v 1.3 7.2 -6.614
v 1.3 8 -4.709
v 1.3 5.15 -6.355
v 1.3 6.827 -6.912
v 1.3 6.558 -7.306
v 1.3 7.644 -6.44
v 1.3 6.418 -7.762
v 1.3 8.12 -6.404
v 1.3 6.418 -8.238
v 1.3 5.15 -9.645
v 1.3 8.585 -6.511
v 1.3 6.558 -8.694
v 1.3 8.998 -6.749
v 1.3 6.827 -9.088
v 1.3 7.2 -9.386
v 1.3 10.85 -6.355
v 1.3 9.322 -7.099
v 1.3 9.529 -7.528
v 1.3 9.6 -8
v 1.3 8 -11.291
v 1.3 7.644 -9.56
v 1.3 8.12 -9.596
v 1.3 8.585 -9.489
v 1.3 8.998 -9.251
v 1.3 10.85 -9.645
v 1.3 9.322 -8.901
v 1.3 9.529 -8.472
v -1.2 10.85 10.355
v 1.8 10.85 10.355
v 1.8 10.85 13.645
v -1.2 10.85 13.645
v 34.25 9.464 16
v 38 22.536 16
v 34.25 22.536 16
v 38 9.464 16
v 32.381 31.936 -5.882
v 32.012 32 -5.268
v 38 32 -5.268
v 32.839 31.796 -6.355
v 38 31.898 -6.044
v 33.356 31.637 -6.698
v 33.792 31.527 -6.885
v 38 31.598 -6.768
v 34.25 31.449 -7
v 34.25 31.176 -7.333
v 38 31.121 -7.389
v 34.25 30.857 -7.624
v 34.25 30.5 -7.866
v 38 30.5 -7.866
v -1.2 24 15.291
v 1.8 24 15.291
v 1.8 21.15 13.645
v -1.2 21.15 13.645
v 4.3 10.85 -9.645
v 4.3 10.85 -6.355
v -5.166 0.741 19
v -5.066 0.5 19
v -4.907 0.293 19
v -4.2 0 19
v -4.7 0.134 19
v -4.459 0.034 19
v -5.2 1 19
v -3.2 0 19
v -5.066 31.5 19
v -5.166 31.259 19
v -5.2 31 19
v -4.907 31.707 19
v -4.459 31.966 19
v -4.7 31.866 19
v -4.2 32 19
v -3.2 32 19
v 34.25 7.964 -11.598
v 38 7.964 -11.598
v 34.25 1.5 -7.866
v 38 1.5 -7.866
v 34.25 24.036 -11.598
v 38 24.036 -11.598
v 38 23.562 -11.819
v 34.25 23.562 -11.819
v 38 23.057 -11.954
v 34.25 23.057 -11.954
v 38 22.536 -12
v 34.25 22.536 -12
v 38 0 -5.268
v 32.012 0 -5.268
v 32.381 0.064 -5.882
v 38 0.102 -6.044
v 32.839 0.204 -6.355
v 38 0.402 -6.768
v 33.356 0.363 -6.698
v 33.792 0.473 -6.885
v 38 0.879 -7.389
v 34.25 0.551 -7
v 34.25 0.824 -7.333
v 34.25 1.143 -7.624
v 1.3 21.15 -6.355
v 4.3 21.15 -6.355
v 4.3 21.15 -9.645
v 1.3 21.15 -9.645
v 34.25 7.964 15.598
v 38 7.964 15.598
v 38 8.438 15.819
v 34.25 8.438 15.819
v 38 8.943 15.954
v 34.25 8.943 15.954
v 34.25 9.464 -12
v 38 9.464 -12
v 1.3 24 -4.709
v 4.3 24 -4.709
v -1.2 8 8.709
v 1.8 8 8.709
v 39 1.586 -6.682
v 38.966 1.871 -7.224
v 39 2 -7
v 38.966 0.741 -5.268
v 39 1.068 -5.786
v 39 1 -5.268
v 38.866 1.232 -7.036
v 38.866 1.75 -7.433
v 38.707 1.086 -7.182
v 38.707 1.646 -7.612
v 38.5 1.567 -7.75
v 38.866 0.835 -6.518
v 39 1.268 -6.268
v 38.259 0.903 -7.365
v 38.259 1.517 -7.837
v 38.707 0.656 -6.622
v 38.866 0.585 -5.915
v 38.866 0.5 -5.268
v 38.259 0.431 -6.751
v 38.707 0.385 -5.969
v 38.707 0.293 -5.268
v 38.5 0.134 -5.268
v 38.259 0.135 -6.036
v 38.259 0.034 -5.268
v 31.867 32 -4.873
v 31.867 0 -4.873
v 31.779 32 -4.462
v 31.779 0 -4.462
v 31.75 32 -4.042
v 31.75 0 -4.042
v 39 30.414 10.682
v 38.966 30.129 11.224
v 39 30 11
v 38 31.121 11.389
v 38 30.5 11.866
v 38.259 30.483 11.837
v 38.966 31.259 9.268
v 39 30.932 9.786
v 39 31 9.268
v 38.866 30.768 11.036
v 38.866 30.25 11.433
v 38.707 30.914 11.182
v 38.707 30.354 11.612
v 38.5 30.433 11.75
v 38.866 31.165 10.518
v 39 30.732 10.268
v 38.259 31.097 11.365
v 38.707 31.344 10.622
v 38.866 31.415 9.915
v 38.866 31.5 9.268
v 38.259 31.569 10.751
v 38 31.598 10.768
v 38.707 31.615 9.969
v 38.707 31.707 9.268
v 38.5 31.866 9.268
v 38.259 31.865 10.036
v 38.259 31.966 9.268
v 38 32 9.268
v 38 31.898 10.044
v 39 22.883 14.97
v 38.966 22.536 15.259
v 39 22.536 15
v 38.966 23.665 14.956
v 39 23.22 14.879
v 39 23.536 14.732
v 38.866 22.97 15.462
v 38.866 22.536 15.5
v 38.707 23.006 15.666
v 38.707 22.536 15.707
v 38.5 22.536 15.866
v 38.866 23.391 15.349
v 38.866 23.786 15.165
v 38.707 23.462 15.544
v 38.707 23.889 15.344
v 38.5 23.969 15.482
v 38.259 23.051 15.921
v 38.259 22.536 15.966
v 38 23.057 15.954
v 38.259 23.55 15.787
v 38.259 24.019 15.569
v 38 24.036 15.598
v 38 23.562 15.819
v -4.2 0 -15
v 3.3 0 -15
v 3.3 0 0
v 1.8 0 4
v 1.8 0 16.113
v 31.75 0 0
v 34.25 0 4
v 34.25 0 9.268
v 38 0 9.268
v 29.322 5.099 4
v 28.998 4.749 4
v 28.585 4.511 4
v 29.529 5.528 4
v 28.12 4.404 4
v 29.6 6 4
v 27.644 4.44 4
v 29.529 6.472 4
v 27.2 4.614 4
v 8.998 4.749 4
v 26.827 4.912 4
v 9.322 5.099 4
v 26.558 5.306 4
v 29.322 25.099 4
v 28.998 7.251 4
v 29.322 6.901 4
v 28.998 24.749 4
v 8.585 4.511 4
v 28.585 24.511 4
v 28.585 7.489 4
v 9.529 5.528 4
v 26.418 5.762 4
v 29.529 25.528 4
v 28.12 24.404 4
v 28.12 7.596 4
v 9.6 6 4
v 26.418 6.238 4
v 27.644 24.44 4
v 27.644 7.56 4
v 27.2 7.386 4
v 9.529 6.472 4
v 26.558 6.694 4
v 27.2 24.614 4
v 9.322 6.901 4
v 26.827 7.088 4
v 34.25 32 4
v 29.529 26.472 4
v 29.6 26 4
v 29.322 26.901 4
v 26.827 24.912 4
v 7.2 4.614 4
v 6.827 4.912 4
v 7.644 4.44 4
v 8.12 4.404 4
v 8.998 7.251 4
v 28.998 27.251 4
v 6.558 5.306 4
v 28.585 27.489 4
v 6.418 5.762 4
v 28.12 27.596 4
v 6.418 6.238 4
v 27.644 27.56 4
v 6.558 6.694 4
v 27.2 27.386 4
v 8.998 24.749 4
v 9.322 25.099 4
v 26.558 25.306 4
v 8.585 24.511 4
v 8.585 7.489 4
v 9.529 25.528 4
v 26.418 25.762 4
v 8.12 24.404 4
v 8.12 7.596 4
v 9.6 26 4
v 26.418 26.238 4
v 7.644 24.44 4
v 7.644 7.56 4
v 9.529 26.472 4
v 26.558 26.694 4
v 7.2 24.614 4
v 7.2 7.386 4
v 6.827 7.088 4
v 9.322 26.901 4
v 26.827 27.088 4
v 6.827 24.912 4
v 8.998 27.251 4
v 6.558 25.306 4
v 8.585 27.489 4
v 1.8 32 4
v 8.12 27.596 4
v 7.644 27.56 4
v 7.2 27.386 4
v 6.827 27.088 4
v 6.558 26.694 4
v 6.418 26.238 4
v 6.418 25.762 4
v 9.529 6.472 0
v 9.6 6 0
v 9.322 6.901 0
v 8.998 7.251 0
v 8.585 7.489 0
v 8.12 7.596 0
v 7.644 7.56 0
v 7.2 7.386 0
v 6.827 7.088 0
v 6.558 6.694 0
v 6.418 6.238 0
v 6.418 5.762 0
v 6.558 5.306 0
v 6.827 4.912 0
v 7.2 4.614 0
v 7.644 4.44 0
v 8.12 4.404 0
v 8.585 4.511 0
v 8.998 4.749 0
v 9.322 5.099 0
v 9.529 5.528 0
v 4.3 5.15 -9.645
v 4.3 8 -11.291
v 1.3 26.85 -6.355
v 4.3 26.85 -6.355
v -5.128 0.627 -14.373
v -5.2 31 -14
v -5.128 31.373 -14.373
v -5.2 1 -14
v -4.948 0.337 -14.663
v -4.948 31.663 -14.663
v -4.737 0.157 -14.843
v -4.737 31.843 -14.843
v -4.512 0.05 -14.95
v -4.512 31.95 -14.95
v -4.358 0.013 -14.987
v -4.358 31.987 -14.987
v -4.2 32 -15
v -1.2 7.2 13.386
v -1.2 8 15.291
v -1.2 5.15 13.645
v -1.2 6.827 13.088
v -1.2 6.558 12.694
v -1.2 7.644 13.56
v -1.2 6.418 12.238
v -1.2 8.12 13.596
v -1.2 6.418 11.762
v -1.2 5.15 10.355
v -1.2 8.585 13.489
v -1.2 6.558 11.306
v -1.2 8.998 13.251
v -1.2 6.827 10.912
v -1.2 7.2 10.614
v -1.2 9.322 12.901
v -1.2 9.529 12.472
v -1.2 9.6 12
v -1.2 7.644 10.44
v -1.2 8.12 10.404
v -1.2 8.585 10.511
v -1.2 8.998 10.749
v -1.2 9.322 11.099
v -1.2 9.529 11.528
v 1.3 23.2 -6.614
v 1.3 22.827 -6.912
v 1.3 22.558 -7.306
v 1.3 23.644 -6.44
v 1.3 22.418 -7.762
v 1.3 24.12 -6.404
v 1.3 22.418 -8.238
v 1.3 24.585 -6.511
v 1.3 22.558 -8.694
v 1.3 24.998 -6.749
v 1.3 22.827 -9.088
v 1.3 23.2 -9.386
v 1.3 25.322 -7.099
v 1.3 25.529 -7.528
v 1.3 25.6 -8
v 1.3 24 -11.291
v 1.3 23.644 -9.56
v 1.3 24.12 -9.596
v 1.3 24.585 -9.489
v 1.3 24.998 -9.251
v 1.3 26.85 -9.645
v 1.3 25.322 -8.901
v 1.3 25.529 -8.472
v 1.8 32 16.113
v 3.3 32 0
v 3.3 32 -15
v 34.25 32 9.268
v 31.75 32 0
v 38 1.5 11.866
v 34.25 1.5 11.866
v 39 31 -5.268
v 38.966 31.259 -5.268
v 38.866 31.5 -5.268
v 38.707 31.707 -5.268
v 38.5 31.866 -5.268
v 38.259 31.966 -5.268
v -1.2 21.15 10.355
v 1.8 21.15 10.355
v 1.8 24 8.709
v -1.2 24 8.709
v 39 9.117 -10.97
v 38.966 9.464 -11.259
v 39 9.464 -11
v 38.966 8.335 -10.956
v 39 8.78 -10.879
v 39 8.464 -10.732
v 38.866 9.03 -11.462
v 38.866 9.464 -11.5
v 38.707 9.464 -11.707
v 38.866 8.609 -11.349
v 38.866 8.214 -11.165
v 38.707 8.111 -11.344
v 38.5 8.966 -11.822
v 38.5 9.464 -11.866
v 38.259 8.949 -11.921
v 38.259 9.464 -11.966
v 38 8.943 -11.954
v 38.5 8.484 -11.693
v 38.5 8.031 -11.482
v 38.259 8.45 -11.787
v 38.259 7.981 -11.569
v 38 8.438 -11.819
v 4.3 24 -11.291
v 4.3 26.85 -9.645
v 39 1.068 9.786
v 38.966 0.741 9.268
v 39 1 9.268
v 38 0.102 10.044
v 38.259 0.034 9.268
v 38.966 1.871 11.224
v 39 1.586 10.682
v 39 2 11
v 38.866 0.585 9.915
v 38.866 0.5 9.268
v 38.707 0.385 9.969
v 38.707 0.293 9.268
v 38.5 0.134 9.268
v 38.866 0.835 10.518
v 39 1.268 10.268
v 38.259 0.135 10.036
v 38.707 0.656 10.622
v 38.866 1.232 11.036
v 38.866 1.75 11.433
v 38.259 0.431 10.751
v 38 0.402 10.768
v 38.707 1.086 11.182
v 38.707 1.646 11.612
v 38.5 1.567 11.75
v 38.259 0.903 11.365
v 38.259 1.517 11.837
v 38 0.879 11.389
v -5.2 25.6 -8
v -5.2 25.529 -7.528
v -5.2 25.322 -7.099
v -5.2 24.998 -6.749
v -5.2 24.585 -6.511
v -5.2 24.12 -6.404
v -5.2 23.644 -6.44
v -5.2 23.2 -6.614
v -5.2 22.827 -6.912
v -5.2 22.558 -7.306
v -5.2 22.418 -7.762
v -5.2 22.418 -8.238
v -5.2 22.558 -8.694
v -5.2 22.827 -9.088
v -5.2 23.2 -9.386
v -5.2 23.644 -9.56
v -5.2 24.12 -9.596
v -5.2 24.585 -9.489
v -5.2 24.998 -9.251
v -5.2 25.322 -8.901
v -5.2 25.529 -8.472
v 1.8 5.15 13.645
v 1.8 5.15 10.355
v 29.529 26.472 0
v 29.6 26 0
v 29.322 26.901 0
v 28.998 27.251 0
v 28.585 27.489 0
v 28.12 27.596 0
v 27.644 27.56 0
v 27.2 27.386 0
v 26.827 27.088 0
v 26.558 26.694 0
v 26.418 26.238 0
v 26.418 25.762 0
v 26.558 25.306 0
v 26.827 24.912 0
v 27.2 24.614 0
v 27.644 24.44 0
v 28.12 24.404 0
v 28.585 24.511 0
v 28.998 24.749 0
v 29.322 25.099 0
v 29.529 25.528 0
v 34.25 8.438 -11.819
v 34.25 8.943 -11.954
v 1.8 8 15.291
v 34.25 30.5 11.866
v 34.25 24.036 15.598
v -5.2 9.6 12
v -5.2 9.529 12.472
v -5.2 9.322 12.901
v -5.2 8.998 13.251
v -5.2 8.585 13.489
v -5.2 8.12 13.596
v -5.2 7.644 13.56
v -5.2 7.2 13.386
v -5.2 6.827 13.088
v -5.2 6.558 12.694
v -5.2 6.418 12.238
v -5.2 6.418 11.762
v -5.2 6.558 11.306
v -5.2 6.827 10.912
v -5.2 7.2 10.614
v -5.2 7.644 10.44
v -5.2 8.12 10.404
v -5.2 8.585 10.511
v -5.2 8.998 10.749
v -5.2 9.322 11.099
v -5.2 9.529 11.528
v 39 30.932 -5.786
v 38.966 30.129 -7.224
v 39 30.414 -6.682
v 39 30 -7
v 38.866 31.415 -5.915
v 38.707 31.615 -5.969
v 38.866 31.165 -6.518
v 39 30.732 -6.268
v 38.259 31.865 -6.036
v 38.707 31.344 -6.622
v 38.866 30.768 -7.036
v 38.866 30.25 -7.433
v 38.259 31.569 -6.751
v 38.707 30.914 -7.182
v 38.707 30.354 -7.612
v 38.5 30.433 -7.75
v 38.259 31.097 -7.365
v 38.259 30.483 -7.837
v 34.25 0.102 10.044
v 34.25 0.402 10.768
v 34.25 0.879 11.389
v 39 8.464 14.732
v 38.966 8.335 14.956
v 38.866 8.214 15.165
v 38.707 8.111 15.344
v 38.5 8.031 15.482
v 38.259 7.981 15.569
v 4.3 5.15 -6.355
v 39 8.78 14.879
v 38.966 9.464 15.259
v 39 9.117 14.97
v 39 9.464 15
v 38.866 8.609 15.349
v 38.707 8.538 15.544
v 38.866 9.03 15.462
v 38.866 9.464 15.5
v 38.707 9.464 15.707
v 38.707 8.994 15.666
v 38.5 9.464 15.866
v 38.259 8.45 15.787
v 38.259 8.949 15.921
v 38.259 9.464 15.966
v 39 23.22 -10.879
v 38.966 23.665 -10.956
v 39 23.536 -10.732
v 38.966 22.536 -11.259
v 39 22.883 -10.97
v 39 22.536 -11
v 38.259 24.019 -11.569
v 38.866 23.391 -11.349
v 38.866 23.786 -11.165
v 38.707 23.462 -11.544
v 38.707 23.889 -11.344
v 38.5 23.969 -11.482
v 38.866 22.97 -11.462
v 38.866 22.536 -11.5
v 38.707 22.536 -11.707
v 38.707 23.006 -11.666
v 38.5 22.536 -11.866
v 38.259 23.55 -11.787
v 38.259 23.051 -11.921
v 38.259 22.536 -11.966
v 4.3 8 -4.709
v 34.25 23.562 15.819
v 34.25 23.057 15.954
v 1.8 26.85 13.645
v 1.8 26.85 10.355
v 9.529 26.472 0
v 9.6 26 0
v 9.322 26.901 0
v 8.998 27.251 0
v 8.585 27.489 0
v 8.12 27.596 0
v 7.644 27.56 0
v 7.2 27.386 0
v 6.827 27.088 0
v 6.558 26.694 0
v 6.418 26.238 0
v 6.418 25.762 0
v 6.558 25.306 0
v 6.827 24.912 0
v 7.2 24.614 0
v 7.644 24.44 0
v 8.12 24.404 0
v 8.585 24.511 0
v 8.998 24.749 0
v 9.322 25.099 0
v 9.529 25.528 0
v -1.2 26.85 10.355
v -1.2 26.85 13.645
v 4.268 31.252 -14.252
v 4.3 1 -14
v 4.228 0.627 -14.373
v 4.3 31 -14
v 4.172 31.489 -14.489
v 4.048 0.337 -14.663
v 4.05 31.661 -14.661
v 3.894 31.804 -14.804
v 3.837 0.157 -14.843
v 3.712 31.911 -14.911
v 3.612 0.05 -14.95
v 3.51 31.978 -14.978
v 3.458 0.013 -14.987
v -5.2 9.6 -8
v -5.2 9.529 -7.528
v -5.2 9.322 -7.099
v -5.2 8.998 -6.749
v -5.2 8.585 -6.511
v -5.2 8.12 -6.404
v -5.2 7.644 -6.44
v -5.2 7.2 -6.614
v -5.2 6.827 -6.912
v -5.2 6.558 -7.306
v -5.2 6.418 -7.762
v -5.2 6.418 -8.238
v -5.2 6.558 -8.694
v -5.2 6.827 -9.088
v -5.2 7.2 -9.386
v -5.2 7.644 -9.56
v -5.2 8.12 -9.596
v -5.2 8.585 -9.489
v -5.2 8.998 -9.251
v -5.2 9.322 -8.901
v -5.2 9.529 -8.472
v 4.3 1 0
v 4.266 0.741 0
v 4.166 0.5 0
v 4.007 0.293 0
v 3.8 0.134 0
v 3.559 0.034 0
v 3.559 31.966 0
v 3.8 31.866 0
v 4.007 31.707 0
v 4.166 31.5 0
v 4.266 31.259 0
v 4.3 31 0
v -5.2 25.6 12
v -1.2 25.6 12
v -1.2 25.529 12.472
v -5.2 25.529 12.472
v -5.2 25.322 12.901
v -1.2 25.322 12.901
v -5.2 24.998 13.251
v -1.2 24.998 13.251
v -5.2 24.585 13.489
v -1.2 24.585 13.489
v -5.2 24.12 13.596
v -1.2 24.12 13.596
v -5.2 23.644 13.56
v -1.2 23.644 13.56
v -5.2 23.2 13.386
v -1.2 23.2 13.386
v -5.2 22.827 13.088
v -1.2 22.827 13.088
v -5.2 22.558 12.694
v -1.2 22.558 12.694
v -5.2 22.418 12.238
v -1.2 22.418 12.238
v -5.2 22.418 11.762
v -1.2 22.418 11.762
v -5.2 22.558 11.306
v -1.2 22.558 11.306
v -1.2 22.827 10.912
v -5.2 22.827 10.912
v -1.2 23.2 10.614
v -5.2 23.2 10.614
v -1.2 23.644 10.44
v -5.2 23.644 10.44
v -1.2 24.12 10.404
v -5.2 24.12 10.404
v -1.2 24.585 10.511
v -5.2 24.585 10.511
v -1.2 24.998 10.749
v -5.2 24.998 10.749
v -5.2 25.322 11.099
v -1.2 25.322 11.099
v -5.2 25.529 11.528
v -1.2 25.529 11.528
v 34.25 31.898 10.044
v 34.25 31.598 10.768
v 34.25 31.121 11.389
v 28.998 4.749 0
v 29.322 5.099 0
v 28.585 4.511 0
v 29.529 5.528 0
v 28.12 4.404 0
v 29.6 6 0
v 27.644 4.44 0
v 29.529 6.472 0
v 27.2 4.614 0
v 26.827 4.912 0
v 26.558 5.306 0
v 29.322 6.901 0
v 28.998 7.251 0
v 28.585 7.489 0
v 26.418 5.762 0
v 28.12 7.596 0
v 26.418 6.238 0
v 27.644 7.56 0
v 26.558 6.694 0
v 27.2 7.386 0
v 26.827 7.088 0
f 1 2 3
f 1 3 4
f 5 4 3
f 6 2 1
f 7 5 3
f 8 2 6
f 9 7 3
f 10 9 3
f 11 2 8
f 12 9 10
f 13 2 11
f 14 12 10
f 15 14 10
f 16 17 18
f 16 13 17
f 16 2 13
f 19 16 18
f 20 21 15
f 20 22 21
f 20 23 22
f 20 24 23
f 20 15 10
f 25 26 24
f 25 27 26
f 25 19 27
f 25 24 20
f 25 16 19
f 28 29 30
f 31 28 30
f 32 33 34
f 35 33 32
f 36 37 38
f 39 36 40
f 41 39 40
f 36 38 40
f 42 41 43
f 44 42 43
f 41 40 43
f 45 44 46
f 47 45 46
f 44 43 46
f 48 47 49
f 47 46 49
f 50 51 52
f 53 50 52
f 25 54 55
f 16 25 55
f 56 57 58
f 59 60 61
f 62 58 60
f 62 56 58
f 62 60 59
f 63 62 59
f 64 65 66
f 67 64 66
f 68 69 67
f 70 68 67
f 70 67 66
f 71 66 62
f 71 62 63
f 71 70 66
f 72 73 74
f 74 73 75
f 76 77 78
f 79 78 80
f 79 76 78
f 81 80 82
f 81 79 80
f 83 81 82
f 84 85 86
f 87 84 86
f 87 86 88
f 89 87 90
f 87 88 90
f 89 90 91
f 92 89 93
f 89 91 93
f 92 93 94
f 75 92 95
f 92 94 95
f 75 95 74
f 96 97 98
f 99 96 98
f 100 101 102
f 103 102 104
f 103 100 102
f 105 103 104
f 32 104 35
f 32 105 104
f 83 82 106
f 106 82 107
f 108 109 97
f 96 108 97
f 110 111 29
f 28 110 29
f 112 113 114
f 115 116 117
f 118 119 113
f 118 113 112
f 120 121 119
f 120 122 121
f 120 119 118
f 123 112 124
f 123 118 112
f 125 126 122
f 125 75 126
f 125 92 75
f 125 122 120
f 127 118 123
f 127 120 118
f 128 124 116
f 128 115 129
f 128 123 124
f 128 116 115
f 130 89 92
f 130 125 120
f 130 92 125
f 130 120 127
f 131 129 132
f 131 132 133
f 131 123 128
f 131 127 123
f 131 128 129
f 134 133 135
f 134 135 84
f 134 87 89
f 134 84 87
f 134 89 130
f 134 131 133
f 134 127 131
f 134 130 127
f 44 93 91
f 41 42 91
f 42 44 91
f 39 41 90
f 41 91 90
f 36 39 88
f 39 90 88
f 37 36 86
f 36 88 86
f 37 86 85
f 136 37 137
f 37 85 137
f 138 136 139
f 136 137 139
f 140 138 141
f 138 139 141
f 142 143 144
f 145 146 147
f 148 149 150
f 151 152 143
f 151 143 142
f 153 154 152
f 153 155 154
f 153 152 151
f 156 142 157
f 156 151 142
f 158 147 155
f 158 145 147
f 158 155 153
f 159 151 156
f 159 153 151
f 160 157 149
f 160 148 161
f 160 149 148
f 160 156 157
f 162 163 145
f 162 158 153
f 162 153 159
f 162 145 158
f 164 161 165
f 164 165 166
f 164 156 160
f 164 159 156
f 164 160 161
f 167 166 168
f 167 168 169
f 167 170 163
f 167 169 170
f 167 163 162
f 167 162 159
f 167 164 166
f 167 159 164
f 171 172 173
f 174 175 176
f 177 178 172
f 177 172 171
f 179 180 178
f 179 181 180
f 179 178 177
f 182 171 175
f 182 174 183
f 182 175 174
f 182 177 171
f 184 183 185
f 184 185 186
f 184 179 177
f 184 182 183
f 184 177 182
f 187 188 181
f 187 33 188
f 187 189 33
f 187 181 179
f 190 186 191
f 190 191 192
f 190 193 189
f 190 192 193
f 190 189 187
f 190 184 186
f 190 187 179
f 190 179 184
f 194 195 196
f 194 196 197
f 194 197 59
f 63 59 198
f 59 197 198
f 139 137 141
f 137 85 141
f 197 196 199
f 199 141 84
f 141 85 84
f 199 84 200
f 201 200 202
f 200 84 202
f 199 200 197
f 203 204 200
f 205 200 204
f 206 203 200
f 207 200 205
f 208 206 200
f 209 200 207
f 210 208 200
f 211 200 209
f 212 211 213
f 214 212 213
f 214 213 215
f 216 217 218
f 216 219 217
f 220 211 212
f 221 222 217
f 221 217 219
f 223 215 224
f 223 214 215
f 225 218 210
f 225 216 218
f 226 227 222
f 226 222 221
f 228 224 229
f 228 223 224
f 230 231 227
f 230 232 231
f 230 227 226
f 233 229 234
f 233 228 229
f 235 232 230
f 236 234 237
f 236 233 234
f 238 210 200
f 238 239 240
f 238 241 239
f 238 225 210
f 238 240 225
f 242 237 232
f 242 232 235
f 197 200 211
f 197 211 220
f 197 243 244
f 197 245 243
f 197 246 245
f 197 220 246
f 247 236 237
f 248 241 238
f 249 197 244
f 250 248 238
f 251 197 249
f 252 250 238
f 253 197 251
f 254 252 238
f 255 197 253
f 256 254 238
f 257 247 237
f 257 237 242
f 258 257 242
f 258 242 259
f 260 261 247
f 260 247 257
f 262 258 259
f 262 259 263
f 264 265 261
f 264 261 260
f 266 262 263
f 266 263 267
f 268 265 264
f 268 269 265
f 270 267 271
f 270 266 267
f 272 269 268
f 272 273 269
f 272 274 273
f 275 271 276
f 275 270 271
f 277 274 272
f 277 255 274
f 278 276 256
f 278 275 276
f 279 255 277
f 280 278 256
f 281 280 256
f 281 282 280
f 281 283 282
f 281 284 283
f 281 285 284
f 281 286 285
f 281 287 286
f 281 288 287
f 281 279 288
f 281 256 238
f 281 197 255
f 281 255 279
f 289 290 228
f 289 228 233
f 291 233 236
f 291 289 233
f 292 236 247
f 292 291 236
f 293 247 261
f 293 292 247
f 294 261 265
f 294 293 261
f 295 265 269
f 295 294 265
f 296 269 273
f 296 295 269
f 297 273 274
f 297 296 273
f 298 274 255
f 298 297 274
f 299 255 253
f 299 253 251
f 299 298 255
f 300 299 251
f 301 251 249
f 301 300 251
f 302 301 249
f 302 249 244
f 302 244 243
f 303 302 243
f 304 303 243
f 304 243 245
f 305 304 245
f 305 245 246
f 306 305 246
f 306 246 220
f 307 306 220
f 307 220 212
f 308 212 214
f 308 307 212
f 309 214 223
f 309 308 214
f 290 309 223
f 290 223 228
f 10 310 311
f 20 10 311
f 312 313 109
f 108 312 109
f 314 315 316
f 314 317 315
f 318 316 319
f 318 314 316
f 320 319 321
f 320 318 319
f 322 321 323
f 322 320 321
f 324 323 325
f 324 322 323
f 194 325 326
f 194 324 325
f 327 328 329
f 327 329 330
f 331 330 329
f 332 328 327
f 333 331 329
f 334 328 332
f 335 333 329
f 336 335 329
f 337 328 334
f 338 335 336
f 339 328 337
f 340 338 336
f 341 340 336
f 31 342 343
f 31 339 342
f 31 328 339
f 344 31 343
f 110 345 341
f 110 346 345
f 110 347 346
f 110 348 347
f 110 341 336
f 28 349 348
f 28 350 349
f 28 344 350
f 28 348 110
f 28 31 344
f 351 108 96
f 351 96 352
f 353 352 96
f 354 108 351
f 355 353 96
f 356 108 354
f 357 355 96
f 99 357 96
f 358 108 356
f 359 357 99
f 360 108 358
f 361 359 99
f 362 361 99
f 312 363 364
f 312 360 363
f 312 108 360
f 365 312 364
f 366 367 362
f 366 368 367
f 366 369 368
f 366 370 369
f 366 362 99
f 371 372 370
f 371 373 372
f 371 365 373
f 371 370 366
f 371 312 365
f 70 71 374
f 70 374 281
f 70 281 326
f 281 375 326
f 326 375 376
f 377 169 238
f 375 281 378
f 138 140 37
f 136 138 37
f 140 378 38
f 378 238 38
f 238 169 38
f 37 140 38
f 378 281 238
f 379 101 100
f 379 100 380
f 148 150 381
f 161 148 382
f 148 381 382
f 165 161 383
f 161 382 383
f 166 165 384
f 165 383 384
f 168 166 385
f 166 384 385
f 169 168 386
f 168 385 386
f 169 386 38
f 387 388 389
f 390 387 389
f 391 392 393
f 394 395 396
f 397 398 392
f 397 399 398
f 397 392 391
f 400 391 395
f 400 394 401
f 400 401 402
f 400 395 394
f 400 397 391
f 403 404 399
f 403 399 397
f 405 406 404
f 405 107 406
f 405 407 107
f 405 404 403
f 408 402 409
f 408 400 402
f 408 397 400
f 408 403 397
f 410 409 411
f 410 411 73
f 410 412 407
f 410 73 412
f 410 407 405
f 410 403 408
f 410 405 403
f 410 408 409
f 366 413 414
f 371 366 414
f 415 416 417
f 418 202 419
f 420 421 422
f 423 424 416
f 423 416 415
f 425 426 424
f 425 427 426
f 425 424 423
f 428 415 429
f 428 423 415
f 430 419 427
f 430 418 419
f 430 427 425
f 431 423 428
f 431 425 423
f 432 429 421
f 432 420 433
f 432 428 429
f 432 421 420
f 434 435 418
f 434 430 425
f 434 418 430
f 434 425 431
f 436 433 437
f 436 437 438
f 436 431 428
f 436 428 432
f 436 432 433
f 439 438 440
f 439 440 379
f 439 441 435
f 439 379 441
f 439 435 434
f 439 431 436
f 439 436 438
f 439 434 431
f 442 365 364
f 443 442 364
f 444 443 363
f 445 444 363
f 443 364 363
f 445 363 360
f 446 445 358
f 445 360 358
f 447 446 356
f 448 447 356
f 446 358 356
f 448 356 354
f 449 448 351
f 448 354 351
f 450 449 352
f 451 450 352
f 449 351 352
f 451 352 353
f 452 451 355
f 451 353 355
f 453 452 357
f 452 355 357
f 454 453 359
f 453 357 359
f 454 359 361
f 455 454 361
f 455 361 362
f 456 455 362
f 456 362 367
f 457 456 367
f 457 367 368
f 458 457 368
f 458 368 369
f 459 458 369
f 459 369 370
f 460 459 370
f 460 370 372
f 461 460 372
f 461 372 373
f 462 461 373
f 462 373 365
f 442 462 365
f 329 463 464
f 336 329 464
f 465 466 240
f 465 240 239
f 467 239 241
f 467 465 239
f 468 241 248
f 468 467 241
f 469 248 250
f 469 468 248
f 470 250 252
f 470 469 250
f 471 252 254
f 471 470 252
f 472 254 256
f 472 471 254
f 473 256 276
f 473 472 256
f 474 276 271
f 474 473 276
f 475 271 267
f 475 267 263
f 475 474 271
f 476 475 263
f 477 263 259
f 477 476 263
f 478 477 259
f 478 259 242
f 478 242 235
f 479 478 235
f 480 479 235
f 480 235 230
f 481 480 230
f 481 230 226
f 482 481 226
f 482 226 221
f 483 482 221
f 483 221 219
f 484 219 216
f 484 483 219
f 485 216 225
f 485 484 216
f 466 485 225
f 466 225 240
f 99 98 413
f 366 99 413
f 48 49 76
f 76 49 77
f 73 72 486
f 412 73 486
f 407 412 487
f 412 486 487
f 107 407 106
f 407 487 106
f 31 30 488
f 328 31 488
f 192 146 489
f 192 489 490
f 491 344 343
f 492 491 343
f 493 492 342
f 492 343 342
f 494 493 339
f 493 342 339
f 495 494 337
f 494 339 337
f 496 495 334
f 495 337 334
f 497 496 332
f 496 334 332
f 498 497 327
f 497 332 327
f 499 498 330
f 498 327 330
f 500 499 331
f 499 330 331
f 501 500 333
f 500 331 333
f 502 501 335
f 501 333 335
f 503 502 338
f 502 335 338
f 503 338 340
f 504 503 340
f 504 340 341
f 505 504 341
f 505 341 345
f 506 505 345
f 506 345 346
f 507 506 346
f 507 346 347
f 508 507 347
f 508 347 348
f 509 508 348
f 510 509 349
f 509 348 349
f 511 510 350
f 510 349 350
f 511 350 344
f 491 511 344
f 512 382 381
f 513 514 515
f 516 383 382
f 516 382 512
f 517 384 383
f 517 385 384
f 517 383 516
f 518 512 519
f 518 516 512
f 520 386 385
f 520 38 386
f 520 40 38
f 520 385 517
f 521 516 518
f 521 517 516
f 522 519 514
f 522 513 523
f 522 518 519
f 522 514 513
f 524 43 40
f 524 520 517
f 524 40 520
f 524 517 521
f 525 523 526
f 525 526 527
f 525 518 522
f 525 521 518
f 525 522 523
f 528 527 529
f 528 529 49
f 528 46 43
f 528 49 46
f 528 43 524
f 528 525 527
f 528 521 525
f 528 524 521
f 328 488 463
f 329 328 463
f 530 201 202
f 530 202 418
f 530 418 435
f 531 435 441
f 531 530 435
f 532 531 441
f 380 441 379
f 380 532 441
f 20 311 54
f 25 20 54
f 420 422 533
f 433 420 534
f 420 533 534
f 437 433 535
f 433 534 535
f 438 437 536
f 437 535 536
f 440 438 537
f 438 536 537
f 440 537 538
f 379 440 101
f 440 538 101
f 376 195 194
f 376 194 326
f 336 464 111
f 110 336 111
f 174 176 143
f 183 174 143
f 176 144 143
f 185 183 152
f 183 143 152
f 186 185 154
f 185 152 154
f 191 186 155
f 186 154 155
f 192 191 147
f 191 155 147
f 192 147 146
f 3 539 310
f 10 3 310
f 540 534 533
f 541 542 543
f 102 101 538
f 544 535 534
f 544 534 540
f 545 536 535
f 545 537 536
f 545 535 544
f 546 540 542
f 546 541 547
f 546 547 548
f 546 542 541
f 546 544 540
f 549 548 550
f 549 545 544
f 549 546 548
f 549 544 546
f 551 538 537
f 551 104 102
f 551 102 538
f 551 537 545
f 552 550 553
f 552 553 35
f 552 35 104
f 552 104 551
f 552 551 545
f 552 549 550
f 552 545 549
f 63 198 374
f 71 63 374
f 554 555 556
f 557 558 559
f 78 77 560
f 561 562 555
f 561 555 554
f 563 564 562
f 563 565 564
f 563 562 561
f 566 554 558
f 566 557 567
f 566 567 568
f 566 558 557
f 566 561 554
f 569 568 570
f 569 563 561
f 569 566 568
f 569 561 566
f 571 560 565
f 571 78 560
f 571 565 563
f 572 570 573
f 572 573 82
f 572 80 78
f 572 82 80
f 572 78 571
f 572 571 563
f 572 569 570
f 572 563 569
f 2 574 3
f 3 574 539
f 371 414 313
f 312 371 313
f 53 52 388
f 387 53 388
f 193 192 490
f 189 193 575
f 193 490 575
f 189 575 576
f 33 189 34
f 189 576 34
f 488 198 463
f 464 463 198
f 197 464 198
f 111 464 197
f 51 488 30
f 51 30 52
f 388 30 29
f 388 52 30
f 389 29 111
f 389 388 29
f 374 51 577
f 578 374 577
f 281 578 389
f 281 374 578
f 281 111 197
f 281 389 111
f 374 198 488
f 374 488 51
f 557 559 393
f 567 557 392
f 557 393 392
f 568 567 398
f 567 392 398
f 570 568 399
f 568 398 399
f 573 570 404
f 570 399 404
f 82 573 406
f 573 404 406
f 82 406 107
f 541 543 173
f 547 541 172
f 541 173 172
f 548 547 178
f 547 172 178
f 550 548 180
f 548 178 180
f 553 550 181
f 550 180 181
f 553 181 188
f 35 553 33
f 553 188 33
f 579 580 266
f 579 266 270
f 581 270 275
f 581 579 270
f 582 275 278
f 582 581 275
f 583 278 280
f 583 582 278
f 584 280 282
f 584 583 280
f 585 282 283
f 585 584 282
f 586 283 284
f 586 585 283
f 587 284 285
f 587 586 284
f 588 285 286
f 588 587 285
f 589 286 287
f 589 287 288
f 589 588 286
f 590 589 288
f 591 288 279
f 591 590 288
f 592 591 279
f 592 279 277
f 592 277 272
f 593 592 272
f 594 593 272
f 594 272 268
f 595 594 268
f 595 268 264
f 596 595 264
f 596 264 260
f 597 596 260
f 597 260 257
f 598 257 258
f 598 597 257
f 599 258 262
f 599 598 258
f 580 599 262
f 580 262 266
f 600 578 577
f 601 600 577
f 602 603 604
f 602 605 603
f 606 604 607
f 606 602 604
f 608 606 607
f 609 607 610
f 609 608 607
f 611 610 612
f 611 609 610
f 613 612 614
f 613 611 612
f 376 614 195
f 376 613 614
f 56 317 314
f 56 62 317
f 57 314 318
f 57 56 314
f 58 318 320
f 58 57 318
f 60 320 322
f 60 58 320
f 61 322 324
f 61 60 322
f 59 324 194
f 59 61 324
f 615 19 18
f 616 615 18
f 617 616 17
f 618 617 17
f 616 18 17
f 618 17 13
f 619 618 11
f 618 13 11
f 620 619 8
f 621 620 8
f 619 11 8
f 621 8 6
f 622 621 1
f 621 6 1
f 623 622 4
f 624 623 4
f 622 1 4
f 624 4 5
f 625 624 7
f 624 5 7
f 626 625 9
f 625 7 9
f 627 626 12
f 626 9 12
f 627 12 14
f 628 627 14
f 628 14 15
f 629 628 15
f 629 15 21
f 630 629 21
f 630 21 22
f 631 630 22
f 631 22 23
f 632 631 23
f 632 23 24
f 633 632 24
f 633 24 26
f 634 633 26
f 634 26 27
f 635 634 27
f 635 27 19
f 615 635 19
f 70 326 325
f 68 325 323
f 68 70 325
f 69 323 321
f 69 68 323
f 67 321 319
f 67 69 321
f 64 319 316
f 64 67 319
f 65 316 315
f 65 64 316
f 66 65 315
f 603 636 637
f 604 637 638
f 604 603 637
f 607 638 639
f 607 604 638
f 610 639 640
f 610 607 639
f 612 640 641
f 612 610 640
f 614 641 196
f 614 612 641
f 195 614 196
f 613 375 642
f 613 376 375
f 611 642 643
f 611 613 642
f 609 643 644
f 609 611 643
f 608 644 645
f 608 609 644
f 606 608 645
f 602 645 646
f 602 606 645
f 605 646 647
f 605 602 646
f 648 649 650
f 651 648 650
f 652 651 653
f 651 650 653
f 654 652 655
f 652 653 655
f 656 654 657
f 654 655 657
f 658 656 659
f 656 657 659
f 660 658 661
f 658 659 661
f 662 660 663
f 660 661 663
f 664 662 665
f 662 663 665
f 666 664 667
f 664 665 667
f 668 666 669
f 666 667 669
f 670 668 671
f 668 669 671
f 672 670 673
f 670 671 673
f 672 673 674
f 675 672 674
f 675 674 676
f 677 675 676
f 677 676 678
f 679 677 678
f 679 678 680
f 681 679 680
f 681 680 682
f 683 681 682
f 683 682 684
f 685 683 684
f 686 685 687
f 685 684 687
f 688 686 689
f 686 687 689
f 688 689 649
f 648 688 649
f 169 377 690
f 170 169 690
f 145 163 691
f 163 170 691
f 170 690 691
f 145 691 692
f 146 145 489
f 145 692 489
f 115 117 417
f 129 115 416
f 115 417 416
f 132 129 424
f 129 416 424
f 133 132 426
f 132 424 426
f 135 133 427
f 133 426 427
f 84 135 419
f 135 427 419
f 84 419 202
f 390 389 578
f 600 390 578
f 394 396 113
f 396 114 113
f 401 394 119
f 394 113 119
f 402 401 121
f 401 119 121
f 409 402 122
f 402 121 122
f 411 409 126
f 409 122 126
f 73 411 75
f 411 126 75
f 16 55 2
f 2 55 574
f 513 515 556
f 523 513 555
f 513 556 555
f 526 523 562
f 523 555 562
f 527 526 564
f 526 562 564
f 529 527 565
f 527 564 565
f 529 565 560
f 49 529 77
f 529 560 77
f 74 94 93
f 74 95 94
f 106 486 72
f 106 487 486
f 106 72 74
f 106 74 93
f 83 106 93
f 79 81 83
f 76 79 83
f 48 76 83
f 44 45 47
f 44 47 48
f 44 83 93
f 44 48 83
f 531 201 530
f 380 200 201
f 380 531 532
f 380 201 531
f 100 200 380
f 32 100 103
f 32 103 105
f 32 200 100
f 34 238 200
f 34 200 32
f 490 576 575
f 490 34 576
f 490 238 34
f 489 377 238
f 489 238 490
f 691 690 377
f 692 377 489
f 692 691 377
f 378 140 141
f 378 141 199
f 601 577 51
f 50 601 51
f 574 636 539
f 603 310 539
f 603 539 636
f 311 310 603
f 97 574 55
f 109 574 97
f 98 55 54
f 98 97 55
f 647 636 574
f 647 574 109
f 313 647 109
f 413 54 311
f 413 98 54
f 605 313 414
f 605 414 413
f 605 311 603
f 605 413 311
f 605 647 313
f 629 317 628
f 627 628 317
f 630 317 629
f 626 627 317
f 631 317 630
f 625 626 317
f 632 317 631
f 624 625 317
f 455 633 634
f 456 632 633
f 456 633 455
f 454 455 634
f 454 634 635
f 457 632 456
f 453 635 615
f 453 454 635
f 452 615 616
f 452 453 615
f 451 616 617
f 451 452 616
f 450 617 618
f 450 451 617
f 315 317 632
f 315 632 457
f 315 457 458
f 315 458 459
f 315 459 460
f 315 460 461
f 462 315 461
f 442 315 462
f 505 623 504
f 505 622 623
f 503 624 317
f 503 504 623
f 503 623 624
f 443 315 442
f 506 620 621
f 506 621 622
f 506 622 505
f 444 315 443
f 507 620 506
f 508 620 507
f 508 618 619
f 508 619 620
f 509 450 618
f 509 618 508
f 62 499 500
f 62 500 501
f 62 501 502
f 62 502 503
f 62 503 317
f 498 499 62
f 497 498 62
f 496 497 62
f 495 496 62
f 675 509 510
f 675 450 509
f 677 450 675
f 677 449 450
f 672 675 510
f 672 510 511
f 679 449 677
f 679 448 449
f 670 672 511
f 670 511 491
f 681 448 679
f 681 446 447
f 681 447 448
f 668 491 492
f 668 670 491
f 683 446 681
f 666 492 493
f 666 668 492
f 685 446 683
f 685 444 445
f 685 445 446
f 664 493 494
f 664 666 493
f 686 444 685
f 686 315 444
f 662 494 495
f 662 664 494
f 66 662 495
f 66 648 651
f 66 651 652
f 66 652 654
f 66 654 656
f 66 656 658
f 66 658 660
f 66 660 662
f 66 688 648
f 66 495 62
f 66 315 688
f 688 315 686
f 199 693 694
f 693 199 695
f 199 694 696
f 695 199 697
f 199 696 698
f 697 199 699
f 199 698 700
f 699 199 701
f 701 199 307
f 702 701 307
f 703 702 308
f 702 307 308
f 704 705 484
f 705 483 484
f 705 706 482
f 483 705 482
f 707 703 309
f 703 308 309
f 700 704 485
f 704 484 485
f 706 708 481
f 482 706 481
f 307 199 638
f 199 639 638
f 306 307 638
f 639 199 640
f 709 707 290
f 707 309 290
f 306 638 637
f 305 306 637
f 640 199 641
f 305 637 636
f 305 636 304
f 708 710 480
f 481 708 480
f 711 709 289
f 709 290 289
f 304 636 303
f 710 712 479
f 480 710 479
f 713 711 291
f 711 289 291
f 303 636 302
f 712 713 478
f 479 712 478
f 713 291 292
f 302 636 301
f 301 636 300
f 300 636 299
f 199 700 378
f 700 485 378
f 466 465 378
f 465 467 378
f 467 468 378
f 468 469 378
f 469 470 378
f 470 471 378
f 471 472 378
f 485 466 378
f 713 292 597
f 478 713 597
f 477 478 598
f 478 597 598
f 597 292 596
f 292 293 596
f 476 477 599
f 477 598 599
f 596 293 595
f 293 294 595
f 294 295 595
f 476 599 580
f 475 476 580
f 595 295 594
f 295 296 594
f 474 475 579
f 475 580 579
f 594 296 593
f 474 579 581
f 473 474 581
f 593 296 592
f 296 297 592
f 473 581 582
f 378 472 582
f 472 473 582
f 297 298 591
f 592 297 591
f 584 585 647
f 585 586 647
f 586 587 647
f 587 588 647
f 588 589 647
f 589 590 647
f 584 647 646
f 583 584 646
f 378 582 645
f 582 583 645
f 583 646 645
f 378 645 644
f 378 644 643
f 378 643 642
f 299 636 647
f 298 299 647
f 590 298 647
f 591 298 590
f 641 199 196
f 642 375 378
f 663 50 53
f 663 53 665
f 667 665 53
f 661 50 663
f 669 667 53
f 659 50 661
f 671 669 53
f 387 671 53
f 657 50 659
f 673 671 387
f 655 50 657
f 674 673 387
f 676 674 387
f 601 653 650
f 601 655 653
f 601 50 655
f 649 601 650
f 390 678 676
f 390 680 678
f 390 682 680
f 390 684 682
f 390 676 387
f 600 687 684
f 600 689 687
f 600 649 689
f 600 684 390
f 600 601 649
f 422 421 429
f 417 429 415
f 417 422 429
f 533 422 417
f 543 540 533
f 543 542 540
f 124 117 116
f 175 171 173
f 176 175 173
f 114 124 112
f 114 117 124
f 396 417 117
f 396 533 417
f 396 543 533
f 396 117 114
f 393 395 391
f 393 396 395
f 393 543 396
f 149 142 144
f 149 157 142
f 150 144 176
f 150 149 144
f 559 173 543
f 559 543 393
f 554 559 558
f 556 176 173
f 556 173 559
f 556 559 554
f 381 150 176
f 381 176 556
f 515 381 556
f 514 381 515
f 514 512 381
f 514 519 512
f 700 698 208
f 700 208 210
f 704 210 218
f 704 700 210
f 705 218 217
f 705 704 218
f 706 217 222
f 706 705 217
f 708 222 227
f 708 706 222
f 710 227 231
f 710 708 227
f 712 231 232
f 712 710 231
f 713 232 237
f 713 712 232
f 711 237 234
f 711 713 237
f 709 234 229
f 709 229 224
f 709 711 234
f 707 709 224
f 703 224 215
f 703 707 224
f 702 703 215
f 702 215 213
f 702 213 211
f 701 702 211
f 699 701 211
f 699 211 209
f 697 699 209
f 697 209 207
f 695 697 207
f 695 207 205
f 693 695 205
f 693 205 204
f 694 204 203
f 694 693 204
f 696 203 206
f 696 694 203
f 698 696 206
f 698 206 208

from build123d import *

# Parameters (mm, degrees)
SKETCH_1_W          = 36
SKETCH_1_H          = 32
SKETCH_1_R          = 1.6
EXTRUDE_1_DEPTH     = 4
EXTRUDE_2_DEPTH     = 32
SKETCH_8_R          = 1.6
CUT_EXTRUDE_1_DEPTH = 53.619768148
SKETCH1_W           = 4
SKETCH1_H           = 32
BOSS_EXTRUDE1_DEPTH = 3
SKETCH2_W           = 5
SKETCH2_H           = 32
BOSS_EXTRUDE2_DEPTH = 12
CUT_EXTRUDE1_DEPTH  = 5
BOSS_EXTRUDE5_DEPTH = 5
BOSS_EXTRUDE6_START = 3
SKETCH7_W           = 15
SKETCH7_H           = 32
SKETCH7_R           = 1.6
BOSS_EXTRUDE6_DEPTH = 3
CUT_EXTRUDE2_DEPTH  = 0.25
BOSS_EXTRUDE7_START = 2.5
SKETCH9_W           = 15
SKETCH9_H           = 32
SKETCH9_R           = 1.6
BOSS_EXTRUDE7_DEPTH = 2.5
BOSS_EXTRUDE8_DEPTH = 2.5
CUT_EXTRUDE3_DEPTH  = 2.5
FILLET2_R           = 3
FILLET4_R           = 3
FILLET5_R           = 3
FILLET9_R           = 1
CUT_EXTRUDE4_DEPTH  = 3
CUT_EXTRUDE5_DEPTH  = 3
FILLET14_R          = 1
CHAMFER_1_SIZE      = 5
CHAMFER_1_SIZE2     = 2.886751346


with BuildPart() as part:
    # Эскиз1 → Бобышка-Вытянуть1 (new body)
    with BuildSketch(Plane.XY):
        with Locations((18, 16)):
            Rectangle(SKETCH_1_W, SKETCH_1_H)
        with Locations((8, 26)):
            Circle(SKETCH_1_R, mode=Mode.SUBTRACT)
        with Locations((28, 26)):
            Circle(SKETCH_1_R, mode=Mode.SUBTRACT)
        with Locations((8, 6)):
            Circle(SKETCH_1_R, mode=Mode.SUBTRACT)
        with Locations((28, 6)):
            Circle(SKETCH_1_R, mode=Mode.SUBTRACT)
    extrude(amount=EXTRUDE_1_DEPTH)

    # Эскиз7 → Бобышка-Вытянуть2 (add)
    with BuildSketch(Plane(origin=(0, 32, 0), x_dir=(1, 0, 0), z_dir=(0, 1, 0))):
        Polygon((0, 0), (-1.2, 0), (-1.2, 15), (-5.2, 15), (-5.2, -19), (-1.2, -19), (-1.2, -4), (0, -4), align=None)
    extrude(amount=-EXTRUDE_2_DEPTH)

    # Эскиз8 → Вырез-Вытянуть1 (cut, through all)
    with BuildSketch(Plane(origin=(-1.2, 0, 0), x_dir=(0, 0, -1), z_dir=(1, 0, 0))):
        with Locations(Location((8, 24, 0), (0, 0, 90))):
            Circle(SKETCH_8_R)
        with Locations(Location((8, 8, 0), (0, 0, 90))):
            Circle(SKETCH_8_R)
        with Locations(Location((-12, 8, 0), (0, 0, 90))):
            Circle(SKETCH_8_R)
        with Locations(Location((-12, 24, 0), (0, 0, 90))):
            Circle(SKETCH_8_R)
    extrude(amount=-CUT_EXTRUDE_1_DEPTH, mode=Mode.SUBTRACT)

    # Sketch1 → Boss-Extrude1 (add)
    with BuildSketch(Plane(origin=(36, 0, 0), x_dir=(0, 0, -1), z_dir=(1, 0, 0))):
        with Locations((-2, 16)):
            Rectangle(SKETCH1_W, SKETCH1_H)
    extrude(amount=BOSS_EXTRUDE1_DEPTH)

    # Sketch2 → Boss-Extrude2 (add)
    with BuildSketch(Plane(origin=(0, 0, 0), x_dir=(-1, 0, 0), z_dir=(0, 0, -1))):
        with Locations((-36.5, 16)):
            Rectangle(SKETCH2_W, SKETCH2_H)
    extrude(amount=BOSS_EXTRUDE2_DEPTH)

    # Sketch3 → Cut-Extrude1 (cut)
    with BuildSketch(Plane(origin=(39, 0, 0), x_dir=(0, 0, -1), z_dir=(1, 0, 0))):
        Polygon((7, 32), (12, 32), (12, 23.339745962), align=None)
        Polygon((12, 8.660254038), (7, 0), (12, 0), align=None)
    extrude(amount=-CUT_EXTRUDE1_DEPTH, mode=Mode.SUBTRACT)

    # Sketch6 → Boss-Extrude5 (add)
    with BuildSketch(Plane(origin=(39, 0, 0), x_dir=(0, 0, -1), z_dir=(1, 0, 0))):
        Polygon((-16, 8.660254038), (-11, 0), (-4, 0), (-4, 32), (-11, 32), (-16, 23.339745962), align=None)
    extrude(amount=-BOSS_EXTRUDE5_DEPTH)

    # Sketch7 → Boss-Extrude6 (add)
    # profile 1 of 2: a face of its own
    with BuildSketch(Plane(origin=(-1.2, 0, 0), x_dir=(0, 0, -1), z_dir=(1, 0, 0)).offset(BOSS_EXTRUDE6_START)):
        with Locations((7.5, 16)):
            Rectangle(SKETCH7_W, SKETCH7_H)
        with Locations(Location((8, 24, 0), (0, 0, 90))):
            Circle(SKETCH7_R, mode=Mode.SUBTRACT)
        with Locations(Location((8, 8, 0), (0, 0, 90))):
            Circle(SKETCH7_R, mode=Mode.SUBTRACT)
    # profile 2 of 2: a face of its own
    with BuildSketch(Plane(origin=(-1.2, 0, 0), x_dir=(0, 0, -1), z_dir=(1, 0, 0)).offset(BOSS_EXTRUDE6_START)):
        with Locations((-11.5, 16)):
            Rectangle(SKETCH7_W, SKETCH7_H)
        with Locations(Location((-12, 24, 0), (0, 0, 90))):
            Circle(SKETCH7_R, mode=Mode.SUBTRACT)
        with Locations(Location((-12, 8, 0), (0, 0, 90))):
            Circle(SKETCH7_R, mode=Mode.SUBTRACT)
    extrude(amount=-BOSS_EXTRUDE6_DEPTH)

    # Sketch8 → Cut-Extrude2 (cut)
    with BuildSketch(Plane.ZY.offset(-34)):
        Polygon((-12, 23.339745962), (-12, 8.660254038), (-7, 0), (0, 0), (0, 32), (-7, 32), align=None)
        Polygon((4, 32), (4, 0), (11, 0), (16, 8.660254038), (16, 23.339745962), (11, 32), align=None)
    extrude(amount=-CUT_EXTRUDE2_DEPTH, mode=Mode.SUBTRACT)

    # Sketch9 → Boss-Extrude7 (add)
    with BuildSketch(Plane(origin=(1.8, 0, 0), x_dir=(0, 0, -1), z_dir=(1, 0, 0)).offset(BOSS_EXTRUDE7_START)):
        with Locations((7.5, 16)):
            Rectangle(SKETCH9_W, SKETCH9_H)
        with Locations(Location((8, 24, 0), (0, 0, 90))):
            Circle(SKETCH9_R, mode=Mode.SUBTRACT)
        with Locations(Location((8, 8, 0), (0, 0, 90))):
            Circle(SKETCH9_R, mode=Mode.SUBTRACT)
    extrude(amount=-BOSS_EXTRUDE7_DEPTH)

    # Sketch10 → Boss-Extrude8 (add)
    with BuildSketch(Plane.ZY.offset(-34.25)):
        Polygon((-7, 32), (-12, 23.339745962), (-12, 8.660254038), (-7, 0), (0, 0), (0, 32), align=None)
    extrude(amount=BOSS_EXTRUDE8_DEPTH)

    # Sketch11 → Cut-Extrude3 (cut)
    with BuildSketch(Plane.ZY.offset(-31.75)):
        Polygon((-7, 32), (-12, 23.339745962), (-12, 8.660254038), (-7, 0), align=None)
    extrude(amount=-CUT_EXTRUDE3_DEPTH, mode=Mode.SUBTRACT)

    # Fillet2
    # the kernel refuses this fillet: 3 mm, written as the material it takes off along each edge
    with BuildSketch(Plane(origin=(31.75, -7.395099729, -7), x_dir=(1, 0, 0), z_dir=(0, 1, 0))) as fillet2_piece_1:
        with BuildLine():
            CenterArc((3, -2.958039892), FILLET2_R, 99.594068227, 80.405931773)
            Line((0, -2.958039892), (-0.06, -2.958039892))
            Line((-0.06, -2.958039892), (-0.06, 0))
            Line((-0.06, 0), (0, 0.06))
            ThreePointArc((0, 0.06), (1.25, 0.06), (2.49, 0.059160798))
            Line((2.49, 0.059160798), (2.5, 0))
        make_face()
    extrude(amount=46.790199458, mode=Mode.SUBTRACT)

    # Fillet4
    fillet4_edges = [part.edges().sort_by_distance(p)[0] for p in [
        (36.625, 32, -7),
        (36.625, 0, -7),
        (36.625, 8.660254038, -12),
        (36.625, 23.339745962, -12),
    ]]
    fillet(fillet4_edges, radius=FILLET4_R)

    # Fillet5
    fillet5_edges = [part.edges().sort_by_distance(p)[0] for p in [
        (36.625, 32, 11),
        (36.625, 23.339745962, 16),
        (36.625, 8.660254038, 16),
        (36.625, 0, 11),
    ]]
    fillet(fillet5_edges, radius=FILLET5_R)

    # Fillet9
    fillet9_edges = [part.edges().sort_by_distance(p)[0] for p in [
        (39, 4.732050808, -9.732050808),
        (39, 16, -12),
        (39, 27.267949192, -9.732050808),
        (39, 32, 2),
        (39, 31.598076211, -6.767949192),
        (39, 23.31235552, -11.897777479),
        (39, 8.68764448, -11.897777479),
        (39, 0.401923789, -6.767949192),
        (39, 4.732050808, 13.732050808),
        (39, 0, 2),
        (39, 27.267949192, 13.732050808),
        (39, 16, 16),
        (39, 31.598076211, 10.767949192),
        (39, 23.31235552, 15.897777479),
        (39, 8.68764448, 15.897777479),
        (39, 0.401923789, 10.767949192),
    ]]
    fillet(fillet9_edges, radius=FILLET9_R)

    # Sketch12 → Cut-Extrude4 (cut)
    with BuildSketch(Plane(origin=(4.3, 0, 0), x_dir=(0, 0, -1), z_dir=(1, 0, 0))):
        Polygon((6.354551733, 26.85), (4.709103466, 24), (6.354551733, 21.15), (9.645448267, 21.15), (11.290896534, 24), (9.645448267, 26.85), align=None)
        Polygon((6.354551733, 10.85), (4.709103466, 8), (6.354551733, 5.15), (9.645448267, 5.15), (11.290896534, 8), (9.645448267, 10.85), align=None)
    extrude(amount=-CUT_EXTRUDE4_DEPTH, mode=Mode.SUBTRACT)

    # Sketch13 → Cut-Extrude5 (cut)
    with BuildSketch(Plane(origin=(1.8, 0, 0), x_dir=(0, 0, -1), z_dir=(1, 0, 0))):
        Polygon((-15.290896534, 24), (-13.645448267, 21.15), (-10.354551733, 21.15), (-8.709103466, 24), (-10.354551733, 26.85), (-13.645448267, 26.85), align=None)
        Polygon((-15.290896534, 8), (-13.645448267, 5.15), (-10.354551733, 5.15), (-8.709103466, 8), (-10.354551733, 10.85), (-13.645448267, 10.85), align=None)
    extrude(amount=-CUT_EXTRUDE5_DEPTH, mode=Mode.SUBTRACT)

    # Fillet14
    fillet14_edges = [part.edges().sort_by_distance(p)[0] for p in [
        (4.3, 32, -7.5),
        (4.3, 0, -7.5),
        (4.3, 16, -15),
        (-5.2, 16, -15),
        (-5.2, 32, 2),
        (-5.2, 0, 2),
    ]]
    fillet(fillet14_edges, radius=FILLET14_R)

    # Фаска1
    chamfer_1_edges = [part.edges().sort_by_distance(p)[0] for p in [
        (1.8, 16, 19),
    ]]
    chamfer_1_side = [part.faces().sort_by_distance(p)[0] for p in [
        (-1.693709632, 16, 19),
    ]]
    chamfer(chamfer_1_edges, length=CHAMFER_1_SIZE, length2=CHAMFER_1_SIZE2, reference=chamfer_1_side[0])


solid = part.part
